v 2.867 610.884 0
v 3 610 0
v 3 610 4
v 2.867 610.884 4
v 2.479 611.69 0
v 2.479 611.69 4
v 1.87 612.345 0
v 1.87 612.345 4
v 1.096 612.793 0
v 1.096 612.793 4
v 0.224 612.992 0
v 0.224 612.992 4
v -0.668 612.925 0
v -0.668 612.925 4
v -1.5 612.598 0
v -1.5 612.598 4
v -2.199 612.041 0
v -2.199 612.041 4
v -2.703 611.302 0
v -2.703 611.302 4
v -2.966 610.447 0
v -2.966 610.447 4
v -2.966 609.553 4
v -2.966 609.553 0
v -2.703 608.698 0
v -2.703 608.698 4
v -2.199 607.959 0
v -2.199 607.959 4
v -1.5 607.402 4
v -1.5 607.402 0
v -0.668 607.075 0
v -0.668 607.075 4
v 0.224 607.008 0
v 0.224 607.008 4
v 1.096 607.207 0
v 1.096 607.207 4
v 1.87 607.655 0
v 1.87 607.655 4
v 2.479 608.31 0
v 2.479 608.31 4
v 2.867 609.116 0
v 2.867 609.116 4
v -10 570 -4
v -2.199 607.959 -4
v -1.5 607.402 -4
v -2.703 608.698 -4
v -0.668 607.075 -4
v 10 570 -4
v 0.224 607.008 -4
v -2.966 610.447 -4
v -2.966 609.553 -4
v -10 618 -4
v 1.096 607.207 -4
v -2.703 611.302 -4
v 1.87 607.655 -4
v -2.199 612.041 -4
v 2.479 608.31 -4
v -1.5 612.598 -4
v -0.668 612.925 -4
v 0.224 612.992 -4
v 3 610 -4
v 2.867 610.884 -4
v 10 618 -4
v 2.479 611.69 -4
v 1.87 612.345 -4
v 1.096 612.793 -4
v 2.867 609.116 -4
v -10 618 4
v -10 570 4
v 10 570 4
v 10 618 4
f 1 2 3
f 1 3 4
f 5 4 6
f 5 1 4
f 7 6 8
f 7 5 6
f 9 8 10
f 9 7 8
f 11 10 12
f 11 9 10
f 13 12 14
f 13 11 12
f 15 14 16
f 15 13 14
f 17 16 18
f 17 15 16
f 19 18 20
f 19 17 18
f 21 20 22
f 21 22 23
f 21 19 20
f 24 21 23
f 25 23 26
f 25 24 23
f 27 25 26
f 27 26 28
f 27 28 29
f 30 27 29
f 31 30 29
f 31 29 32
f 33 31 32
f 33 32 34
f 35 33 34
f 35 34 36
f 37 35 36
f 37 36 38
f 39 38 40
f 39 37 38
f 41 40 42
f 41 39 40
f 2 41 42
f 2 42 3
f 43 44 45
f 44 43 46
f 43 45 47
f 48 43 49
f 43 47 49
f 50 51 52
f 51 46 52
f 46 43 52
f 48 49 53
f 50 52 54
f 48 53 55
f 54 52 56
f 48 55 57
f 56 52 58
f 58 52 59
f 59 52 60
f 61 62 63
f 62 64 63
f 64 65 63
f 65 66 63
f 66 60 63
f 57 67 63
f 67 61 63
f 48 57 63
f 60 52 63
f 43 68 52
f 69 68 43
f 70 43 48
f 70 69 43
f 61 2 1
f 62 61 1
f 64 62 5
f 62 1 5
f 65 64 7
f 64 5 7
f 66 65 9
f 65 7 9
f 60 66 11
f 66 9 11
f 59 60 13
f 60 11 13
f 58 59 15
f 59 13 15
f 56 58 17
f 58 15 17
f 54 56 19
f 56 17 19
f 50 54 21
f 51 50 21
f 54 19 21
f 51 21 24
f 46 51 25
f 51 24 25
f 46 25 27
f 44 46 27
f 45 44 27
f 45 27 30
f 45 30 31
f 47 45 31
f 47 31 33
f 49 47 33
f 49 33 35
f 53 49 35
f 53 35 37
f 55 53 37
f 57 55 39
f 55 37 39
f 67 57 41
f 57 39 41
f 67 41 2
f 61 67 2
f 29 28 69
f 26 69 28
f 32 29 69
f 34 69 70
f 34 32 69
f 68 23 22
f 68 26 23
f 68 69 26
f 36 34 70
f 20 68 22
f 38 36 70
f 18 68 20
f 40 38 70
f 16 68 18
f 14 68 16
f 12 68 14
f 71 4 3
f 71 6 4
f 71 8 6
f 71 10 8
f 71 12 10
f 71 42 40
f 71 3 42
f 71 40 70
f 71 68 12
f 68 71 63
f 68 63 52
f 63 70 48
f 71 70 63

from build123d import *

# Parameters (mm, degrees)
SKIZZE4_R                            = 3
AUFSATZ_LINEAR_AUSTRAGEN1_DEPTH      = 4
AUFSATZ_LINEAR_AUSTRAGEN1_DEPTH_BACK = 4


with BuildPart() as part:
    # Skizze4 → Aufsatz-Linear austragen1 (new body, two sides)
    with BuildSketch(Plane.XY) as aufsatz_linear_austragen1_sk:
        Polygon((-10, 610), (-10, 570), (10, 570), (10, 610), (10, 618), (-10, 618), align=None)
        with Locations((0, 610)):
            Circle(SKIZZE4_R, mode=Mode.SUBTRACT)
    extrude(amount=AUFSATZ_LINEAR_AUSTRAGEN1_DEPTH)
    extrude(aufsatz_linear_austragen1_sk.sketch, amount=-AUFSATZ_LINEAR_AUSTRAGEN1_DEPTH_BACK)


solid = part.part
